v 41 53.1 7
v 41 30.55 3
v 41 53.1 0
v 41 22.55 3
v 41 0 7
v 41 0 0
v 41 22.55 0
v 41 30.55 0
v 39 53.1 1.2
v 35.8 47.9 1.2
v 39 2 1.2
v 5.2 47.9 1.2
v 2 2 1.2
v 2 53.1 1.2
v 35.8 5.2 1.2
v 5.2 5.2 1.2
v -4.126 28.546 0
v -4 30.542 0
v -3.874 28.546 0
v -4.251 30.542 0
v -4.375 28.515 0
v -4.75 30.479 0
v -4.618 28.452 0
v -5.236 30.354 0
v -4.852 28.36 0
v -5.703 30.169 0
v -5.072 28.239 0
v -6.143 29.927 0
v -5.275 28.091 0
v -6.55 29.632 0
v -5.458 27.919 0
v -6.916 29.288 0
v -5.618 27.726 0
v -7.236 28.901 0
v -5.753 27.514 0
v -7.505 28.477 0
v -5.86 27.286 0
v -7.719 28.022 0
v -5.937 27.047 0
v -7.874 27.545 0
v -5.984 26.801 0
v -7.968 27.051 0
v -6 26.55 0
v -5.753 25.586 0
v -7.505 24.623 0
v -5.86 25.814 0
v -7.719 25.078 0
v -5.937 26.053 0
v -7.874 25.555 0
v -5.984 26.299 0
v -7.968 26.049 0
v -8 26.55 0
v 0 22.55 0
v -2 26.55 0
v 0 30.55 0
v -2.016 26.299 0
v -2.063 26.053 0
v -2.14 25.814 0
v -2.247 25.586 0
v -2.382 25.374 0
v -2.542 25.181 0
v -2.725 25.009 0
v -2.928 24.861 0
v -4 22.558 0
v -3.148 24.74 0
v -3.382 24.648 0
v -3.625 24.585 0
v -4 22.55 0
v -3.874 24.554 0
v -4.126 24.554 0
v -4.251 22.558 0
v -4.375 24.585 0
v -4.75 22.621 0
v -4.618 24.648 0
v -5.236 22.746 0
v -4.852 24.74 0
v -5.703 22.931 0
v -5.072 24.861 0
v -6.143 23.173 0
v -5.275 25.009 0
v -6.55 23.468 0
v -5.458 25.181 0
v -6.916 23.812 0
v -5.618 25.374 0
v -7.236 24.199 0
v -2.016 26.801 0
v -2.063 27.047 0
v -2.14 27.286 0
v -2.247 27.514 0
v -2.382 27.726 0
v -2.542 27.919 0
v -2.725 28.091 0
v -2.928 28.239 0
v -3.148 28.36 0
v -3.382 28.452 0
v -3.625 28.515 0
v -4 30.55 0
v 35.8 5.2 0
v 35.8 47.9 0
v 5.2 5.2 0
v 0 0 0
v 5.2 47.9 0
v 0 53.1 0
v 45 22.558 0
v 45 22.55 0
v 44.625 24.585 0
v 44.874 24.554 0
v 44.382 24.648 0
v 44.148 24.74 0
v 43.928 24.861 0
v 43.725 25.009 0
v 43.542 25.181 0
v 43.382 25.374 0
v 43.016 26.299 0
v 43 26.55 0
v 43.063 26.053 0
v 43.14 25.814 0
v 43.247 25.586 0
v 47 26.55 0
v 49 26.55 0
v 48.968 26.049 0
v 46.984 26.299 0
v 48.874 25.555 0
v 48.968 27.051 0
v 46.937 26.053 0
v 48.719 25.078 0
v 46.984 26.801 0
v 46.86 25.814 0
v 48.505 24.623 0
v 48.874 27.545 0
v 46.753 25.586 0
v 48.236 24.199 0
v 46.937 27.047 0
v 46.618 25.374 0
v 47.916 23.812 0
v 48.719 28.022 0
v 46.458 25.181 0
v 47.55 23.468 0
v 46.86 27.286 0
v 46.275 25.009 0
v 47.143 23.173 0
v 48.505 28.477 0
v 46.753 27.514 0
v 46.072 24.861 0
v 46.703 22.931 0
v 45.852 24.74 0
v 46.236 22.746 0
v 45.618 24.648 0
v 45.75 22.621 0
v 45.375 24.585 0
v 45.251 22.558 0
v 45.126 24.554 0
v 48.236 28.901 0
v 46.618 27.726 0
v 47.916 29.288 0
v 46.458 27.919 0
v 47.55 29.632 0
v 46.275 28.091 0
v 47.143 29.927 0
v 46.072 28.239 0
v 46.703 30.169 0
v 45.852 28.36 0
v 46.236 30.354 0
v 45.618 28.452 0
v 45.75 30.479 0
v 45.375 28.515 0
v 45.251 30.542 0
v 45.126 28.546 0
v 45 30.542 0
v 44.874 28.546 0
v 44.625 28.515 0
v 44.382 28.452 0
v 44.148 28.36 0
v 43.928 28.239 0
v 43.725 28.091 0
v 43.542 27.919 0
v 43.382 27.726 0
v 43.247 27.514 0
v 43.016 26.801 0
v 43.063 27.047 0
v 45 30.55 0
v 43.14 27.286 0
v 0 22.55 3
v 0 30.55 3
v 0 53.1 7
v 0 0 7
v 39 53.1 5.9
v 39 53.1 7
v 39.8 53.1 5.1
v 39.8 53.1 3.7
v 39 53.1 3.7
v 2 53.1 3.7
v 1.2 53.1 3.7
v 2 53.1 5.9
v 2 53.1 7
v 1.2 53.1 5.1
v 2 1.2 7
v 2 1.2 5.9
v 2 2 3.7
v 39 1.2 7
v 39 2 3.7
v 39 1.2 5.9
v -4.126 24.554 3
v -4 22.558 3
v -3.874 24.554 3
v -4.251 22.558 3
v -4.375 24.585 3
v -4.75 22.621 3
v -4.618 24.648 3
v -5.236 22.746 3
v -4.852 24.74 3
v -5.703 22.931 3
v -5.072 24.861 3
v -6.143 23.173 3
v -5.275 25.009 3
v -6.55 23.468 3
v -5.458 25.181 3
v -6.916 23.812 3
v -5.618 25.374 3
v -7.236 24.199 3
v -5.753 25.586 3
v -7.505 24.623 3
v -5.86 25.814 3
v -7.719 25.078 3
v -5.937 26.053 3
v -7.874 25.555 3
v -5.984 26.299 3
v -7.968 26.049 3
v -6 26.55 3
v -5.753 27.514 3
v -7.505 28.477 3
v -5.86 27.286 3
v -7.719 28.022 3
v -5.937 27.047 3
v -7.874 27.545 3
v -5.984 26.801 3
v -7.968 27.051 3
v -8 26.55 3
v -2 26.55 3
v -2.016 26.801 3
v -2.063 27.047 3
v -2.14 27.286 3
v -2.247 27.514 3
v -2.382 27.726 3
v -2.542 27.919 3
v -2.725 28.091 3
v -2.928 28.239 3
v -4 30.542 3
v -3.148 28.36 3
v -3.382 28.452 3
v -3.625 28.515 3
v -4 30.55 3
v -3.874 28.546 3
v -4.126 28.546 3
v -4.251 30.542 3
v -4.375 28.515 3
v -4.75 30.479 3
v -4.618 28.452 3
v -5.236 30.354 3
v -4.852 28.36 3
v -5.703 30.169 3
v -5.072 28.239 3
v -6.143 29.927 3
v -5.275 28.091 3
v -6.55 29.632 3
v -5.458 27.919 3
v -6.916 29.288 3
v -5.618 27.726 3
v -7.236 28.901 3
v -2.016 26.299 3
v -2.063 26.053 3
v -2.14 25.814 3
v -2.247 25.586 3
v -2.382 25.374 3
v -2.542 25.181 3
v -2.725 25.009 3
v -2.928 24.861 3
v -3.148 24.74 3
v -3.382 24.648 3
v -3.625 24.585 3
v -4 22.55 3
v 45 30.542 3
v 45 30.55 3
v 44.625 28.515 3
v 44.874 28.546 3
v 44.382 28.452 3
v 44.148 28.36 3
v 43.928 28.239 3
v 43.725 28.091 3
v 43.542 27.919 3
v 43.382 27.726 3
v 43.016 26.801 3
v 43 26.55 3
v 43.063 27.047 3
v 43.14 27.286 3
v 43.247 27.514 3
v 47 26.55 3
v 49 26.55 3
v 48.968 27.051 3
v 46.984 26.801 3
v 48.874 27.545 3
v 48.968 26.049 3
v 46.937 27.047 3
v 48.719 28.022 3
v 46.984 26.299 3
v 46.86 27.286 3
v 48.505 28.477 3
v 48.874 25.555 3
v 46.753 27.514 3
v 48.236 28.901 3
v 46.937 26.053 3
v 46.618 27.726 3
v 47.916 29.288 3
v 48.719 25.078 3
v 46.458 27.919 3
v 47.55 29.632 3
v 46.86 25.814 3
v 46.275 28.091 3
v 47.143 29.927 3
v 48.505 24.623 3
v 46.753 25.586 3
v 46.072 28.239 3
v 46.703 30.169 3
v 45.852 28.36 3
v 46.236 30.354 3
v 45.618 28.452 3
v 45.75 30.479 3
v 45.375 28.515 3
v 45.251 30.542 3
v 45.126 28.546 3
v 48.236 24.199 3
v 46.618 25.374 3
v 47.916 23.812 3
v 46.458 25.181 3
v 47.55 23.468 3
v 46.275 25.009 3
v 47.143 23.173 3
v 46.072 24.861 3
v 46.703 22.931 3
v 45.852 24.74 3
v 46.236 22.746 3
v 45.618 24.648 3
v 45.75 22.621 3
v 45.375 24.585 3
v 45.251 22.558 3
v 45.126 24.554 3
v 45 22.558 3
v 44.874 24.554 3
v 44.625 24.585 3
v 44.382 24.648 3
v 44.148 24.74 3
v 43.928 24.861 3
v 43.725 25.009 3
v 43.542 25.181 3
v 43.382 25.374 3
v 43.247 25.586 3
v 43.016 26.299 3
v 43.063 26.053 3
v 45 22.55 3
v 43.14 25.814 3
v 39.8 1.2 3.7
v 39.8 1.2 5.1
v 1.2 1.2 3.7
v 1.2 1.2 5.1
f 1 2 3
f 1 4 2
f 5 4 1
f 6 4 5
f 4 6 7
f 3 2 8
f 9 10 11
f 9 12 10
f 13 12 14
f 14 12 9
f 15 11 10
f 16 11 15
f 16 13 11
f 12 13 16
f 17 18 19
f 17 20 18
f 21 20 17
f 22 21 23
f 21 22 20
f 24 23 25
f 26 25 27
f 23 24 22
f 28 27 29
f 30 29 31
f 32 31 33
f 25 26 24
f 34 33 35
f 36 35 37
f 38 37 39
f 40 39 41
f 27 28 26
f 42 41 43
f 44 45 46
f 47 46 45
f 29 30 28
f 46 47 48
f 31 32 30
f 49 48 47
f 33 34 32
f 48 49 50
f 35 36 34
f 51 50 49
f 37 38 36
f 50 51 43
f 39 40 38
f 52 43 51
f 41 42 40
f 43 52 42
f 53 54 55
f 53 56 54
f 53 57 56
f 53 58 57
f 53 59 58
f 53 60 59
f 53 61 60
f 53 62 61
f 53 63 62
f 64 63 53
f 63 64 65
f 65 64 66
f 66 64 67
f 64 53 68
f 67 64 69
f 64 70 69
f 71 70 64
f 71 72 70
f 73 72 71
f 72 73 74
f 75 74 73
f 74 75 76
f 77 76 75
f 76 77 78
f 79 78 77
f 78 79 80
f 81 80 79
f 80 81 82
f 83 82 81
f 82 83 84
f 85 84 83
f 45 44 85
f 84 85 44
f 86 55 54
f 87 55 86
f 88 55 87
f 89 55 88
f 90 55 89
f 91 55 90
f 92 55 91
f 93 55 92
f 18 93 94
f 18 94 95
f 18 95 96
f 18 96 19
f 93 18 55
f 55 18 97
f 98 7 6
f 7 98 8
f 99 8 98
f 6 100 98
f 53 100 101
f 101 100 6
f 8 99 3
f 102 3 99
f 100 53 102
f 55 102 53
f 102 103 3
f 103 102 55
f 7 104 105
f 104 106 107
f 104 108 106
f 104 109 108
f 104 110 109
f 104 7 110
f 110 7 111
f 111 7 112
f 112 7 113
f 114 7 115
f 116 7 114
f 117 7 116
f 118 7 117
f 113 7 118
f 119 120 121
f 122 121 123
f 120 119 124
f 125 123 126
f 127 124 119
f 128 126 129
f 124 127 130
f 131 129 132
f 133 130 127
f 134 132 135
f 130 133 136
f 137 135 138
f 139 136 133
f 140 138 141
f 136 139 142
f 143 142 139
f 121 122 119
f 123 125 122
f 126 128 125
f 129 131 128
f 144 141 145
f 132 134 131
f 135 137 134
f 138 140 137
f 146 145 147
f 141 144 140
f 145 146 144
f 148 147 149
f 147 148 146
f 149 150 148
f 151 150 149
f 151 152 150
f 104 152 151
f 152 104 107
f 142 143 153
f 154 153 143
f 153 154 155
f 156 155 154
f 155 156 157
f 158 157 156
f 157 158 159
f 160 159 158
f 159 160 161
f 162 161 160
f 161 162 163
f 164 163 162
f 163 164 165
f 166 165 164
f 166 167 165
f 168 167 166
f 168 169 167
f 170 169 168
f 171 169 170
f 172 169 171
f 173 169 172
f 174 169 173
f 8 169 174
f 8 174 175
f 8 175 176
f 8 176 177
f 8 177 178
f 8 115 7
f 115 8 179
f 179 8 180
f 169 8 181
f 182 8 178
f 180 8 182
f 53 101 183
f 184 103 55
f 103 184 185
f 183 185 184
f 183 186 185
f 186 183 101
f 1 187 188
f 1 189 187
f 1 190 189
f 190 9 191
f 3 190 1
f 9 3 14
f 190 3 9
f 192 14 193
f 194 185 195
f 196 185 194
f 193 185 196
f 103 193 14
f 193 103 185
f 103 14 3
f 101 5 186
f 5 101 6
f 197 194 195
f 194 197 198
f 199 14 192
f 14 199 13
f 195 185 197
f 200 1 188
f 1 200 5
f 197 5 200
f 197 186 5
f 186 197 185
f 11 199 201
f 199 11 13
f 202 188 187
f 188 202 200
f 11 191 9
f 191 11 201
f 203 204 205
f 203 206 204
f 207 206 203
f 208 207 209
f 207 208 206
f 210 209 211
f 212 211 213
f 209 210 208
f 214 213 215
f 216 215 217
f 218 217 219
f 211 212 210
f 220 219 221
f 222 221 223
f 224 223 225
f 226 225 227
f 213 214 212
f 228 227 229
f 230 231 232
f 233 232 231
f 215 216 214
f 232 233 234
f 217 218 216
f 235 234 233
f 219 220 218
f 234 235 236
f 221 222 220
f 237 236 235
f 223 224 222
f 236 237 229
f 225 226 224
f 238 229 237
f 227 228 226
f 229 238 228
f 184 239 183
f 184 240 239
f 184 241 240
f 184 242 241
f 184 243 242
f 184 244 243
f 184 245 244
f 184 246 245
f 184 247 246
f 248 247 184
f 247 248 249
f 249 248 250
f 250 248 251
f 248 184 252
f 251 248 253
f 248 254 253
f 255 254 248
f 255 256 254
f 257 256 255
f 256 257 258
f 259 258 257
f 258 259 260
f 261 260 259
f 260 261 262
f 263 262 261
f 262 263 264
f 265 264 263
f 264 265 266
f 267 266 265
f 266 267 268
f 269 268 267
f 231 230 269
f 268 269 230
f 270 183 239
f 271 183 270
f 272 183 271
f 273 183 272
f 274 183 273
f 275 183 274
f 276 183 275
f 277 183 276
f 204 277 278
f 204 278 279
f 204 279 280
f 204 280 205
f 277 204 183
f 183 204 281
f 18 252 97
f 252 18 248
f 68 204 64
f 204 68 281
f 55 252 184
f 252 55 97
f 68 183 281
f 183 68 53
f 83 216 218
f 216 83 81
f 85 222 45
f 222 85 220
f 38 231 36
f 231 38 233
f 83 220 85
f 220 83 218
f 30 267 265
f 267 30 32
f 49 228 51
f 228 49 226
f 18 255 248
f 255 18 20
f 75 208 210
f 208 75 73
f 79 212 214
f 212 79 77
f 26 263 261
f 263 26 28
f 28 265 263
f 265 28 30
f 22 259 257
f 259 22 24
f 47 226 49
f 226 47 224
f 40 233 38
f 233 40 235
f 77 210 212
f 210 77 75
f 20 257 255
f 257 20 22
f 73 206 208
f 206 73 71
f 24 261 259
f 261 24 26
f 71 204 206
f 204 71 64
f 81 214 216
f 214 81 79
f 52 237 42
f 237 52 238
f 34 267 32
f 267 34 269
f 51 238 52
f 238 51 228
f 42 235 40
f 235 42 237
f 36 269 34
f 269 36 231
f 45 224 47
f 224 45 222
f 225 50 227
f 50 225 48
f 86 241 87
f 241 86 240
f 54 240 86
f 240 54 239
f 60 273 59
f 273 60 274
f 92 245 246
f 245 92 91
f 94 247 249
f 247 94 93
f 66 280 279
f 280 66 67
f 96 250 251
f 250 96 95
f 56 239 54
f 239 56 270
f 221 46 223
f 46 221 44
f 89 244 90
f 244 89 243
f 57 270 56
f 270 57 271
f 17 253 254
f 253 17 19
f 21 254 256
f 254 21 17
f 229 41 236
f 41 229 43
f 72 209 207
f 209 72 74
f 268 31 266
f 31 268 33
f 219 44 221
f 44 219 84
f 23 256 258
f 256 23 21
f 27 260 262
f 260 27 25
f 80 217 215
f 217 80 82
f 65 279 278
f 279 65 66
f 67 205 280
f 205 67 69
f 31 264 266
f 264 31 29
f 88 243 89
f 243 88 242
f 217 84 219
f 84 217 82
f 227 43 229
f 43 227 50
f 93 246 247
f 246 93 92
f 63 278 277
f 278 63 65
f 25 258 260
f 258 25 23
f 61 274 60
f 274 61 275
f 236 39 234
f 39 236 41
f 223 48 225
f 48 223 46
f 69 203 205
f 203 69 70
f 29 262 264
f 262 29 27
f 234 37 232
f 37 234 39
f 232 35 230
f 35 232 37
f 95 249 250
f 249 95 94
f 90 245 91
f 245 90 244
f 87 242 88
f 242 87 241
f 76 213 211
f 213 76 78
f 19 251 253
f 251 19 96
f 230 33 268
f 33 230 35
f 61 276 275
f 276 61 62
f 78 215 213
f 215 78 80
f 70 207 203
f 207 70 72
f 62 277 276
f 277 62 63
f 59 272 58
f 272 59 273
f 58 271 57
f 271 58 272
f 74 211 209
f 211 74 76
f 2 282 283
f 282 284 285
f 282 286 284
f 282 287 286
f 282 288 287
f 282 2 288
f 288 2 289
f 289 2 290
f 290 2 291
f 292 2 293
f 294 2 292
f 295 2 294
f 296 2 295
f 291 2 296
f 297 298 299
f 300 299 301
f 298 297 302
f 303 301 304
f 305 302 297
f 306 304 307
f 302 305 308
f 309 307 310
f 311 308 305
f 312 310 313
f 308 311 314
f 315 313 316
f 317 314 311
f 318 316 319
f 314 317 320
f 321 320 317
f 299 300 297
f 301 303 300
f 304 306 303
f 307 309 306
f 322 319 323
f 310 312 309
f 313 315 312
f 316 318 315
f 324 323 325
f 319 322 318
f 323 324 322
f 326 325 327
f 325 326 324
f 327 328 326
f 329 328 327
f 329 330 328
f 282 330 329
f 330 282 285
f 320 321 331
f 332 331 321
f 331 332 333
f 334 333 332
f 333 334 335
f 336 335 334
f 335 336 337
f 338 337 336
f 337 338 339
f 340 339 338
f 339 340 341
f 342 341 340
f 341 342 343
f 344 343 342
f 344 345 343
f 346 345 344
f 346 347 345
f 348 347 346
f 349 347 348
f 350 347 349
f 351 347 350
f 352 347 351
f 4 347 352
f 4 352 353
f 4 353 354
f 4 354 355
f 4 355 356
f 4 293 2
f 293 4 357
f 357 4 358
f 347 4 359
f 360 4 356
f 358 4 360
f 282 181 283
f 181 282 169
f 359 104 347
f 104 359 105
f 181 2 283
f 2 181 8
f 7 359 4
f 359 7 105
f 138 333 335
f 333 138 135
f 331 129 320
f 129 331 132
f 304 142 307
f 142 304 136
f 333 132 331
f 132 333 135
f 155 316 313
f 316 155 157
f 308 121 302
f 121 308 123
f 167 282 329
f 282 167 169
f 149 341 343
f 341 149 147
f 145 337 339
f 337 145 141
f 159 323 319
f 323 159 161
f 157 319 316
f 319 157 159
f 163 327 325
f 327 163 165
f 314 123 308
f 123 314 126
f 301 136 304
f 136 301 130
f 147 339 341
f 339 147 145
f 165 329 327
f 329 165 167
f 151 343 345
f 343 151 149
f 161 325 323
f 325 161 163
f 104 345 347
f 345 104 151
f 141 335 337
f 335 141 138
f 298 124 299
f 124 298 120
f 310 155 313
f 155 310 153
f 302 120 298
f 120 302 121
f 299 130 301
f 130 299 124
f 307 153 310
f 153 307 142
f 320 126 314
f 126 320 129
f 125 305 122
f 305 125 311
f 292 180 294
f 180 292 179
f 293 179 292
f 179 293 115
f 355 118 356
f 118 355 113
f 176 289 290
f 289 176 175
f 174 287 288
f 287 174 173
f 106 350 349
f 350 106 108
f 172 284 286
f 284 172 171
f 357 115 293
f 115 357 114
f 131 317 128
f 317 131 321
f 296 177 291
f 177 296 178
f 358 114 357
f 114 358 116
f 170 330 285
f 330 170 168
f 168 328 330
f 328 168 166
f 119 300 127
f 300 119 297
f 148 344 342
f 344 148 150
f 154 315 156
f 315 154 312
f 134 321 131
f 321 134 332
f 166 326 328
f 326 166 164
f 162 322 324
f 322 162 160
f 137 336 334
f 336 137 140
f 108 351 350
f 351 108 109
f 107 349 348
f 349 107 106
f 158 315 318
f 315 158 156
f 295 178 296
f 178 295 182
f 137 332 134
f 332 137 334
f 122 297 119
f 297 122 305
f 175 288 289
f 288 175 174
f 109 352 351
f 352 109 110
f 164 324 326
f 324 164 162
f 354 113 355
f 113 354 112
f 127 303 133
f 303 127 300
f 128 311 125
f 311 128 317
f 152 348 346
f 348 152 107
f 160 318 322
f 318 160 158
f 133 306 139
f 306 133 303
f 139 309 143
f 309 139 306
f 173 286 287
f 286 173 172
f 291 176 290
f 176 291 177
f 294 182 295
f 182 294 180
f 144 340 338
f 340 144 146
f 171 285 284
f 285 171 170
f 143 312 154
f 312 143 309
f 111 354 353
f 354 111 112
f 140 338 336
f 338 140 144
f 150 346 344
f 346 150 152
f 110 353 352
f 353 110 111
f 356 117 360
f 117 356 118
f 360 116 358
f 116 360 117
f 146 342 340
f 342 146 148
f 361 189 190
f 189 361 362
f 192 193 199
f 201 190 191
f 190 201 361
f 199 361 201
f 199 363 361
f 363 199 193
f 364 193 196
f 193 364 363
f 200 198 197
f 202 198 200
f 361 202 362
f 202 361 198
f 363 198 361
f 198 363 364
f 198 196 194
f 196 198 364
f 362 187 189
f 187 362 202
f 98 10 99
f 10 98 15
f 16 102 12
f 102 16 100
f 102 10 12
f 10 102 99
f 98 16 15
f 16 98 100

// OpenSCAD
// file: ../lib/pcb_led_cvf.scad
// for led power module modified

/* bluetooth_mate_holder.scad
 * By John Biehler - November 17, 2011
 * http://www.thingiverse.com/thing:

 * derived from pcb_box_slide_with_tabs.scad
 * By Nicholas C Lewis - Jan 1, 2011
 * http://www.thingiverse.com/thing:5396
 *
 * derived from pcb_box_slide.scad
 *     Parametric, open PCB-box (slide-in) by chlunde
 *     http://www.thingiverse.com/thing:4071
 *
 * CHANGES
 * - adjusted to fit Arduino Mega
 * - added mounting tabs
 * - turned off cutouts
 * - adjusted bottom cutout size
 */

$fn=50;

module pcb_led_cvf(

	pcb_width = 48.2,
	pcb_length =24.1,
	pcb_height =1.1,
	slisse = 0.8,

	pcb_bottom_margin = 1,
	wall_width_thick = 2,
	box_height = 7,

	//tab parameters
	tab_hole_radius=2,
	tab_outer_radius=4,

	inner_margin = 4,

	add_tabs = true

) {
	wall_width = wall_width_thick-slisse;

module tab() {
	difference(){
		union() {
			translate([-tab_outer_radius,-tab_outer_radius,0])
			cube([tab_outer_radius,2*tab_outer_radius,wall_width_thick+1]);
			translate([-tab_outer_radius,0,0])
				cylinder(r=tab_outer_radius, h = wall_width_thick+1);
		}
		translate([-tab_outer_radius,0,0]) {
			cylinder(r= tab_hole_radius, h = wall_width_thick+5,center=true);
		}
	}

}

module box() {
	union() {
		cube([pcb_width + 2*wall_width, pcb_length + 2*wall_width, wall_width]);

		cube([wall_width_thick, pcb_length + 2*wall_width, box_height]);

		cube([pcb_width + 2*wall_width, wall_width_thick, box_height]);

		%translate([0, pcb_length+wall_width, 0])
			cube([pcb_width + 2*wall_width,wall_width,box_height]);

		translate([pcb_width + wall_width - slisse,0,0])
			cube([wall_width_thick, pcb_length + 2*wall_width, box_height]);
	}
	if(add_tabs) {
//comment out this part to remove tabs
		for(i=[(pcb_length + 2*wall_width)/2]){
	translate([0,i,0])tab();
	translate([pcb_width + 2*wall_width,i,0])mirror()tab();
		}
	}

}

module pcb() {
	translate([wall_width, wall_width, wall_width + pcb_bottom_margin])
		cube([pcb_width,pcb_length + wall_width + 0.1,pcb_height]);
	translate([wall_width, wall_width, wall_width + pcb_bottom_margin+pcb_height])rotate([0,45,0])
		cube([pcb_height,pcb_length + wall_width + 0.1,pcb_height]);
	translate([wall_width+pcb_width-2*cos(45)*pcb_height, wall_width, wall_width + pcb_bottom_margin+pcb_height])rotate([0,45,0])
		cube([pcb_height,pcb_length + wall_width + 0.1,pcb_height]);
	translate([wall_width_thick, wall_width, wall_width + pcb_bottom_margin])
		cube([pcb_width-2*slisse,pcb_length + wall_width + 0.1,box_height]);

}



module holes() {
		*translate([wall_width + pcb_width/2, wall_width_thick + 0.1, pcb_width/2+wall_width])
			rotate(a=90,v=[1,0,0])
				cylinder(r=pcb_width/2, h=wall_width_thick + 0.2);

		*translate([-0.1, wall_width + pcb_length/2, pcb_length/2 + wall_width])
			rotate(a=90,v=[0,1,0])
				cylinder(r=pcb_length/2, h=wall_width_thick + 0.2);

		*translate([pcb_width + wall_width - slisse - 0.1, wall_width + pcb_length/2, pcb_length/2 + wall_width])
			rotate(a=90,v=[0,1,0])
				cylinder(r=pcb_length/2, h=wall_width_thick + 0.2);

	 * translate([pcb_width/2 + wall_width, wall_width + pcb_length/2, -0.1])
			rotate(a=0,v=[0,1,0])
				cylinder(r=min(pcb_length,pcb_width)/2 - wall_width/2, h=wall_width_thick + 0.2);

		translate([inner_margin +wall_width, inner_margin+wall_width, -0.1])
			cube([pcb_width-inner_margin*2,pcb_length -inner_margin*2,wall_width + 0.2]);
}

	difference() {
		box();
		pcb();
		holes();
	}
}



pcb_led_cvf();
// main file
use <../lib/pcb_led_cvf.scad>


pcb_led_cvf(
  pcb_length=50.7,
  pcb_width=38.6,
  pcb_height=1.4,
  pcb_bottom_margin=2.5
);
